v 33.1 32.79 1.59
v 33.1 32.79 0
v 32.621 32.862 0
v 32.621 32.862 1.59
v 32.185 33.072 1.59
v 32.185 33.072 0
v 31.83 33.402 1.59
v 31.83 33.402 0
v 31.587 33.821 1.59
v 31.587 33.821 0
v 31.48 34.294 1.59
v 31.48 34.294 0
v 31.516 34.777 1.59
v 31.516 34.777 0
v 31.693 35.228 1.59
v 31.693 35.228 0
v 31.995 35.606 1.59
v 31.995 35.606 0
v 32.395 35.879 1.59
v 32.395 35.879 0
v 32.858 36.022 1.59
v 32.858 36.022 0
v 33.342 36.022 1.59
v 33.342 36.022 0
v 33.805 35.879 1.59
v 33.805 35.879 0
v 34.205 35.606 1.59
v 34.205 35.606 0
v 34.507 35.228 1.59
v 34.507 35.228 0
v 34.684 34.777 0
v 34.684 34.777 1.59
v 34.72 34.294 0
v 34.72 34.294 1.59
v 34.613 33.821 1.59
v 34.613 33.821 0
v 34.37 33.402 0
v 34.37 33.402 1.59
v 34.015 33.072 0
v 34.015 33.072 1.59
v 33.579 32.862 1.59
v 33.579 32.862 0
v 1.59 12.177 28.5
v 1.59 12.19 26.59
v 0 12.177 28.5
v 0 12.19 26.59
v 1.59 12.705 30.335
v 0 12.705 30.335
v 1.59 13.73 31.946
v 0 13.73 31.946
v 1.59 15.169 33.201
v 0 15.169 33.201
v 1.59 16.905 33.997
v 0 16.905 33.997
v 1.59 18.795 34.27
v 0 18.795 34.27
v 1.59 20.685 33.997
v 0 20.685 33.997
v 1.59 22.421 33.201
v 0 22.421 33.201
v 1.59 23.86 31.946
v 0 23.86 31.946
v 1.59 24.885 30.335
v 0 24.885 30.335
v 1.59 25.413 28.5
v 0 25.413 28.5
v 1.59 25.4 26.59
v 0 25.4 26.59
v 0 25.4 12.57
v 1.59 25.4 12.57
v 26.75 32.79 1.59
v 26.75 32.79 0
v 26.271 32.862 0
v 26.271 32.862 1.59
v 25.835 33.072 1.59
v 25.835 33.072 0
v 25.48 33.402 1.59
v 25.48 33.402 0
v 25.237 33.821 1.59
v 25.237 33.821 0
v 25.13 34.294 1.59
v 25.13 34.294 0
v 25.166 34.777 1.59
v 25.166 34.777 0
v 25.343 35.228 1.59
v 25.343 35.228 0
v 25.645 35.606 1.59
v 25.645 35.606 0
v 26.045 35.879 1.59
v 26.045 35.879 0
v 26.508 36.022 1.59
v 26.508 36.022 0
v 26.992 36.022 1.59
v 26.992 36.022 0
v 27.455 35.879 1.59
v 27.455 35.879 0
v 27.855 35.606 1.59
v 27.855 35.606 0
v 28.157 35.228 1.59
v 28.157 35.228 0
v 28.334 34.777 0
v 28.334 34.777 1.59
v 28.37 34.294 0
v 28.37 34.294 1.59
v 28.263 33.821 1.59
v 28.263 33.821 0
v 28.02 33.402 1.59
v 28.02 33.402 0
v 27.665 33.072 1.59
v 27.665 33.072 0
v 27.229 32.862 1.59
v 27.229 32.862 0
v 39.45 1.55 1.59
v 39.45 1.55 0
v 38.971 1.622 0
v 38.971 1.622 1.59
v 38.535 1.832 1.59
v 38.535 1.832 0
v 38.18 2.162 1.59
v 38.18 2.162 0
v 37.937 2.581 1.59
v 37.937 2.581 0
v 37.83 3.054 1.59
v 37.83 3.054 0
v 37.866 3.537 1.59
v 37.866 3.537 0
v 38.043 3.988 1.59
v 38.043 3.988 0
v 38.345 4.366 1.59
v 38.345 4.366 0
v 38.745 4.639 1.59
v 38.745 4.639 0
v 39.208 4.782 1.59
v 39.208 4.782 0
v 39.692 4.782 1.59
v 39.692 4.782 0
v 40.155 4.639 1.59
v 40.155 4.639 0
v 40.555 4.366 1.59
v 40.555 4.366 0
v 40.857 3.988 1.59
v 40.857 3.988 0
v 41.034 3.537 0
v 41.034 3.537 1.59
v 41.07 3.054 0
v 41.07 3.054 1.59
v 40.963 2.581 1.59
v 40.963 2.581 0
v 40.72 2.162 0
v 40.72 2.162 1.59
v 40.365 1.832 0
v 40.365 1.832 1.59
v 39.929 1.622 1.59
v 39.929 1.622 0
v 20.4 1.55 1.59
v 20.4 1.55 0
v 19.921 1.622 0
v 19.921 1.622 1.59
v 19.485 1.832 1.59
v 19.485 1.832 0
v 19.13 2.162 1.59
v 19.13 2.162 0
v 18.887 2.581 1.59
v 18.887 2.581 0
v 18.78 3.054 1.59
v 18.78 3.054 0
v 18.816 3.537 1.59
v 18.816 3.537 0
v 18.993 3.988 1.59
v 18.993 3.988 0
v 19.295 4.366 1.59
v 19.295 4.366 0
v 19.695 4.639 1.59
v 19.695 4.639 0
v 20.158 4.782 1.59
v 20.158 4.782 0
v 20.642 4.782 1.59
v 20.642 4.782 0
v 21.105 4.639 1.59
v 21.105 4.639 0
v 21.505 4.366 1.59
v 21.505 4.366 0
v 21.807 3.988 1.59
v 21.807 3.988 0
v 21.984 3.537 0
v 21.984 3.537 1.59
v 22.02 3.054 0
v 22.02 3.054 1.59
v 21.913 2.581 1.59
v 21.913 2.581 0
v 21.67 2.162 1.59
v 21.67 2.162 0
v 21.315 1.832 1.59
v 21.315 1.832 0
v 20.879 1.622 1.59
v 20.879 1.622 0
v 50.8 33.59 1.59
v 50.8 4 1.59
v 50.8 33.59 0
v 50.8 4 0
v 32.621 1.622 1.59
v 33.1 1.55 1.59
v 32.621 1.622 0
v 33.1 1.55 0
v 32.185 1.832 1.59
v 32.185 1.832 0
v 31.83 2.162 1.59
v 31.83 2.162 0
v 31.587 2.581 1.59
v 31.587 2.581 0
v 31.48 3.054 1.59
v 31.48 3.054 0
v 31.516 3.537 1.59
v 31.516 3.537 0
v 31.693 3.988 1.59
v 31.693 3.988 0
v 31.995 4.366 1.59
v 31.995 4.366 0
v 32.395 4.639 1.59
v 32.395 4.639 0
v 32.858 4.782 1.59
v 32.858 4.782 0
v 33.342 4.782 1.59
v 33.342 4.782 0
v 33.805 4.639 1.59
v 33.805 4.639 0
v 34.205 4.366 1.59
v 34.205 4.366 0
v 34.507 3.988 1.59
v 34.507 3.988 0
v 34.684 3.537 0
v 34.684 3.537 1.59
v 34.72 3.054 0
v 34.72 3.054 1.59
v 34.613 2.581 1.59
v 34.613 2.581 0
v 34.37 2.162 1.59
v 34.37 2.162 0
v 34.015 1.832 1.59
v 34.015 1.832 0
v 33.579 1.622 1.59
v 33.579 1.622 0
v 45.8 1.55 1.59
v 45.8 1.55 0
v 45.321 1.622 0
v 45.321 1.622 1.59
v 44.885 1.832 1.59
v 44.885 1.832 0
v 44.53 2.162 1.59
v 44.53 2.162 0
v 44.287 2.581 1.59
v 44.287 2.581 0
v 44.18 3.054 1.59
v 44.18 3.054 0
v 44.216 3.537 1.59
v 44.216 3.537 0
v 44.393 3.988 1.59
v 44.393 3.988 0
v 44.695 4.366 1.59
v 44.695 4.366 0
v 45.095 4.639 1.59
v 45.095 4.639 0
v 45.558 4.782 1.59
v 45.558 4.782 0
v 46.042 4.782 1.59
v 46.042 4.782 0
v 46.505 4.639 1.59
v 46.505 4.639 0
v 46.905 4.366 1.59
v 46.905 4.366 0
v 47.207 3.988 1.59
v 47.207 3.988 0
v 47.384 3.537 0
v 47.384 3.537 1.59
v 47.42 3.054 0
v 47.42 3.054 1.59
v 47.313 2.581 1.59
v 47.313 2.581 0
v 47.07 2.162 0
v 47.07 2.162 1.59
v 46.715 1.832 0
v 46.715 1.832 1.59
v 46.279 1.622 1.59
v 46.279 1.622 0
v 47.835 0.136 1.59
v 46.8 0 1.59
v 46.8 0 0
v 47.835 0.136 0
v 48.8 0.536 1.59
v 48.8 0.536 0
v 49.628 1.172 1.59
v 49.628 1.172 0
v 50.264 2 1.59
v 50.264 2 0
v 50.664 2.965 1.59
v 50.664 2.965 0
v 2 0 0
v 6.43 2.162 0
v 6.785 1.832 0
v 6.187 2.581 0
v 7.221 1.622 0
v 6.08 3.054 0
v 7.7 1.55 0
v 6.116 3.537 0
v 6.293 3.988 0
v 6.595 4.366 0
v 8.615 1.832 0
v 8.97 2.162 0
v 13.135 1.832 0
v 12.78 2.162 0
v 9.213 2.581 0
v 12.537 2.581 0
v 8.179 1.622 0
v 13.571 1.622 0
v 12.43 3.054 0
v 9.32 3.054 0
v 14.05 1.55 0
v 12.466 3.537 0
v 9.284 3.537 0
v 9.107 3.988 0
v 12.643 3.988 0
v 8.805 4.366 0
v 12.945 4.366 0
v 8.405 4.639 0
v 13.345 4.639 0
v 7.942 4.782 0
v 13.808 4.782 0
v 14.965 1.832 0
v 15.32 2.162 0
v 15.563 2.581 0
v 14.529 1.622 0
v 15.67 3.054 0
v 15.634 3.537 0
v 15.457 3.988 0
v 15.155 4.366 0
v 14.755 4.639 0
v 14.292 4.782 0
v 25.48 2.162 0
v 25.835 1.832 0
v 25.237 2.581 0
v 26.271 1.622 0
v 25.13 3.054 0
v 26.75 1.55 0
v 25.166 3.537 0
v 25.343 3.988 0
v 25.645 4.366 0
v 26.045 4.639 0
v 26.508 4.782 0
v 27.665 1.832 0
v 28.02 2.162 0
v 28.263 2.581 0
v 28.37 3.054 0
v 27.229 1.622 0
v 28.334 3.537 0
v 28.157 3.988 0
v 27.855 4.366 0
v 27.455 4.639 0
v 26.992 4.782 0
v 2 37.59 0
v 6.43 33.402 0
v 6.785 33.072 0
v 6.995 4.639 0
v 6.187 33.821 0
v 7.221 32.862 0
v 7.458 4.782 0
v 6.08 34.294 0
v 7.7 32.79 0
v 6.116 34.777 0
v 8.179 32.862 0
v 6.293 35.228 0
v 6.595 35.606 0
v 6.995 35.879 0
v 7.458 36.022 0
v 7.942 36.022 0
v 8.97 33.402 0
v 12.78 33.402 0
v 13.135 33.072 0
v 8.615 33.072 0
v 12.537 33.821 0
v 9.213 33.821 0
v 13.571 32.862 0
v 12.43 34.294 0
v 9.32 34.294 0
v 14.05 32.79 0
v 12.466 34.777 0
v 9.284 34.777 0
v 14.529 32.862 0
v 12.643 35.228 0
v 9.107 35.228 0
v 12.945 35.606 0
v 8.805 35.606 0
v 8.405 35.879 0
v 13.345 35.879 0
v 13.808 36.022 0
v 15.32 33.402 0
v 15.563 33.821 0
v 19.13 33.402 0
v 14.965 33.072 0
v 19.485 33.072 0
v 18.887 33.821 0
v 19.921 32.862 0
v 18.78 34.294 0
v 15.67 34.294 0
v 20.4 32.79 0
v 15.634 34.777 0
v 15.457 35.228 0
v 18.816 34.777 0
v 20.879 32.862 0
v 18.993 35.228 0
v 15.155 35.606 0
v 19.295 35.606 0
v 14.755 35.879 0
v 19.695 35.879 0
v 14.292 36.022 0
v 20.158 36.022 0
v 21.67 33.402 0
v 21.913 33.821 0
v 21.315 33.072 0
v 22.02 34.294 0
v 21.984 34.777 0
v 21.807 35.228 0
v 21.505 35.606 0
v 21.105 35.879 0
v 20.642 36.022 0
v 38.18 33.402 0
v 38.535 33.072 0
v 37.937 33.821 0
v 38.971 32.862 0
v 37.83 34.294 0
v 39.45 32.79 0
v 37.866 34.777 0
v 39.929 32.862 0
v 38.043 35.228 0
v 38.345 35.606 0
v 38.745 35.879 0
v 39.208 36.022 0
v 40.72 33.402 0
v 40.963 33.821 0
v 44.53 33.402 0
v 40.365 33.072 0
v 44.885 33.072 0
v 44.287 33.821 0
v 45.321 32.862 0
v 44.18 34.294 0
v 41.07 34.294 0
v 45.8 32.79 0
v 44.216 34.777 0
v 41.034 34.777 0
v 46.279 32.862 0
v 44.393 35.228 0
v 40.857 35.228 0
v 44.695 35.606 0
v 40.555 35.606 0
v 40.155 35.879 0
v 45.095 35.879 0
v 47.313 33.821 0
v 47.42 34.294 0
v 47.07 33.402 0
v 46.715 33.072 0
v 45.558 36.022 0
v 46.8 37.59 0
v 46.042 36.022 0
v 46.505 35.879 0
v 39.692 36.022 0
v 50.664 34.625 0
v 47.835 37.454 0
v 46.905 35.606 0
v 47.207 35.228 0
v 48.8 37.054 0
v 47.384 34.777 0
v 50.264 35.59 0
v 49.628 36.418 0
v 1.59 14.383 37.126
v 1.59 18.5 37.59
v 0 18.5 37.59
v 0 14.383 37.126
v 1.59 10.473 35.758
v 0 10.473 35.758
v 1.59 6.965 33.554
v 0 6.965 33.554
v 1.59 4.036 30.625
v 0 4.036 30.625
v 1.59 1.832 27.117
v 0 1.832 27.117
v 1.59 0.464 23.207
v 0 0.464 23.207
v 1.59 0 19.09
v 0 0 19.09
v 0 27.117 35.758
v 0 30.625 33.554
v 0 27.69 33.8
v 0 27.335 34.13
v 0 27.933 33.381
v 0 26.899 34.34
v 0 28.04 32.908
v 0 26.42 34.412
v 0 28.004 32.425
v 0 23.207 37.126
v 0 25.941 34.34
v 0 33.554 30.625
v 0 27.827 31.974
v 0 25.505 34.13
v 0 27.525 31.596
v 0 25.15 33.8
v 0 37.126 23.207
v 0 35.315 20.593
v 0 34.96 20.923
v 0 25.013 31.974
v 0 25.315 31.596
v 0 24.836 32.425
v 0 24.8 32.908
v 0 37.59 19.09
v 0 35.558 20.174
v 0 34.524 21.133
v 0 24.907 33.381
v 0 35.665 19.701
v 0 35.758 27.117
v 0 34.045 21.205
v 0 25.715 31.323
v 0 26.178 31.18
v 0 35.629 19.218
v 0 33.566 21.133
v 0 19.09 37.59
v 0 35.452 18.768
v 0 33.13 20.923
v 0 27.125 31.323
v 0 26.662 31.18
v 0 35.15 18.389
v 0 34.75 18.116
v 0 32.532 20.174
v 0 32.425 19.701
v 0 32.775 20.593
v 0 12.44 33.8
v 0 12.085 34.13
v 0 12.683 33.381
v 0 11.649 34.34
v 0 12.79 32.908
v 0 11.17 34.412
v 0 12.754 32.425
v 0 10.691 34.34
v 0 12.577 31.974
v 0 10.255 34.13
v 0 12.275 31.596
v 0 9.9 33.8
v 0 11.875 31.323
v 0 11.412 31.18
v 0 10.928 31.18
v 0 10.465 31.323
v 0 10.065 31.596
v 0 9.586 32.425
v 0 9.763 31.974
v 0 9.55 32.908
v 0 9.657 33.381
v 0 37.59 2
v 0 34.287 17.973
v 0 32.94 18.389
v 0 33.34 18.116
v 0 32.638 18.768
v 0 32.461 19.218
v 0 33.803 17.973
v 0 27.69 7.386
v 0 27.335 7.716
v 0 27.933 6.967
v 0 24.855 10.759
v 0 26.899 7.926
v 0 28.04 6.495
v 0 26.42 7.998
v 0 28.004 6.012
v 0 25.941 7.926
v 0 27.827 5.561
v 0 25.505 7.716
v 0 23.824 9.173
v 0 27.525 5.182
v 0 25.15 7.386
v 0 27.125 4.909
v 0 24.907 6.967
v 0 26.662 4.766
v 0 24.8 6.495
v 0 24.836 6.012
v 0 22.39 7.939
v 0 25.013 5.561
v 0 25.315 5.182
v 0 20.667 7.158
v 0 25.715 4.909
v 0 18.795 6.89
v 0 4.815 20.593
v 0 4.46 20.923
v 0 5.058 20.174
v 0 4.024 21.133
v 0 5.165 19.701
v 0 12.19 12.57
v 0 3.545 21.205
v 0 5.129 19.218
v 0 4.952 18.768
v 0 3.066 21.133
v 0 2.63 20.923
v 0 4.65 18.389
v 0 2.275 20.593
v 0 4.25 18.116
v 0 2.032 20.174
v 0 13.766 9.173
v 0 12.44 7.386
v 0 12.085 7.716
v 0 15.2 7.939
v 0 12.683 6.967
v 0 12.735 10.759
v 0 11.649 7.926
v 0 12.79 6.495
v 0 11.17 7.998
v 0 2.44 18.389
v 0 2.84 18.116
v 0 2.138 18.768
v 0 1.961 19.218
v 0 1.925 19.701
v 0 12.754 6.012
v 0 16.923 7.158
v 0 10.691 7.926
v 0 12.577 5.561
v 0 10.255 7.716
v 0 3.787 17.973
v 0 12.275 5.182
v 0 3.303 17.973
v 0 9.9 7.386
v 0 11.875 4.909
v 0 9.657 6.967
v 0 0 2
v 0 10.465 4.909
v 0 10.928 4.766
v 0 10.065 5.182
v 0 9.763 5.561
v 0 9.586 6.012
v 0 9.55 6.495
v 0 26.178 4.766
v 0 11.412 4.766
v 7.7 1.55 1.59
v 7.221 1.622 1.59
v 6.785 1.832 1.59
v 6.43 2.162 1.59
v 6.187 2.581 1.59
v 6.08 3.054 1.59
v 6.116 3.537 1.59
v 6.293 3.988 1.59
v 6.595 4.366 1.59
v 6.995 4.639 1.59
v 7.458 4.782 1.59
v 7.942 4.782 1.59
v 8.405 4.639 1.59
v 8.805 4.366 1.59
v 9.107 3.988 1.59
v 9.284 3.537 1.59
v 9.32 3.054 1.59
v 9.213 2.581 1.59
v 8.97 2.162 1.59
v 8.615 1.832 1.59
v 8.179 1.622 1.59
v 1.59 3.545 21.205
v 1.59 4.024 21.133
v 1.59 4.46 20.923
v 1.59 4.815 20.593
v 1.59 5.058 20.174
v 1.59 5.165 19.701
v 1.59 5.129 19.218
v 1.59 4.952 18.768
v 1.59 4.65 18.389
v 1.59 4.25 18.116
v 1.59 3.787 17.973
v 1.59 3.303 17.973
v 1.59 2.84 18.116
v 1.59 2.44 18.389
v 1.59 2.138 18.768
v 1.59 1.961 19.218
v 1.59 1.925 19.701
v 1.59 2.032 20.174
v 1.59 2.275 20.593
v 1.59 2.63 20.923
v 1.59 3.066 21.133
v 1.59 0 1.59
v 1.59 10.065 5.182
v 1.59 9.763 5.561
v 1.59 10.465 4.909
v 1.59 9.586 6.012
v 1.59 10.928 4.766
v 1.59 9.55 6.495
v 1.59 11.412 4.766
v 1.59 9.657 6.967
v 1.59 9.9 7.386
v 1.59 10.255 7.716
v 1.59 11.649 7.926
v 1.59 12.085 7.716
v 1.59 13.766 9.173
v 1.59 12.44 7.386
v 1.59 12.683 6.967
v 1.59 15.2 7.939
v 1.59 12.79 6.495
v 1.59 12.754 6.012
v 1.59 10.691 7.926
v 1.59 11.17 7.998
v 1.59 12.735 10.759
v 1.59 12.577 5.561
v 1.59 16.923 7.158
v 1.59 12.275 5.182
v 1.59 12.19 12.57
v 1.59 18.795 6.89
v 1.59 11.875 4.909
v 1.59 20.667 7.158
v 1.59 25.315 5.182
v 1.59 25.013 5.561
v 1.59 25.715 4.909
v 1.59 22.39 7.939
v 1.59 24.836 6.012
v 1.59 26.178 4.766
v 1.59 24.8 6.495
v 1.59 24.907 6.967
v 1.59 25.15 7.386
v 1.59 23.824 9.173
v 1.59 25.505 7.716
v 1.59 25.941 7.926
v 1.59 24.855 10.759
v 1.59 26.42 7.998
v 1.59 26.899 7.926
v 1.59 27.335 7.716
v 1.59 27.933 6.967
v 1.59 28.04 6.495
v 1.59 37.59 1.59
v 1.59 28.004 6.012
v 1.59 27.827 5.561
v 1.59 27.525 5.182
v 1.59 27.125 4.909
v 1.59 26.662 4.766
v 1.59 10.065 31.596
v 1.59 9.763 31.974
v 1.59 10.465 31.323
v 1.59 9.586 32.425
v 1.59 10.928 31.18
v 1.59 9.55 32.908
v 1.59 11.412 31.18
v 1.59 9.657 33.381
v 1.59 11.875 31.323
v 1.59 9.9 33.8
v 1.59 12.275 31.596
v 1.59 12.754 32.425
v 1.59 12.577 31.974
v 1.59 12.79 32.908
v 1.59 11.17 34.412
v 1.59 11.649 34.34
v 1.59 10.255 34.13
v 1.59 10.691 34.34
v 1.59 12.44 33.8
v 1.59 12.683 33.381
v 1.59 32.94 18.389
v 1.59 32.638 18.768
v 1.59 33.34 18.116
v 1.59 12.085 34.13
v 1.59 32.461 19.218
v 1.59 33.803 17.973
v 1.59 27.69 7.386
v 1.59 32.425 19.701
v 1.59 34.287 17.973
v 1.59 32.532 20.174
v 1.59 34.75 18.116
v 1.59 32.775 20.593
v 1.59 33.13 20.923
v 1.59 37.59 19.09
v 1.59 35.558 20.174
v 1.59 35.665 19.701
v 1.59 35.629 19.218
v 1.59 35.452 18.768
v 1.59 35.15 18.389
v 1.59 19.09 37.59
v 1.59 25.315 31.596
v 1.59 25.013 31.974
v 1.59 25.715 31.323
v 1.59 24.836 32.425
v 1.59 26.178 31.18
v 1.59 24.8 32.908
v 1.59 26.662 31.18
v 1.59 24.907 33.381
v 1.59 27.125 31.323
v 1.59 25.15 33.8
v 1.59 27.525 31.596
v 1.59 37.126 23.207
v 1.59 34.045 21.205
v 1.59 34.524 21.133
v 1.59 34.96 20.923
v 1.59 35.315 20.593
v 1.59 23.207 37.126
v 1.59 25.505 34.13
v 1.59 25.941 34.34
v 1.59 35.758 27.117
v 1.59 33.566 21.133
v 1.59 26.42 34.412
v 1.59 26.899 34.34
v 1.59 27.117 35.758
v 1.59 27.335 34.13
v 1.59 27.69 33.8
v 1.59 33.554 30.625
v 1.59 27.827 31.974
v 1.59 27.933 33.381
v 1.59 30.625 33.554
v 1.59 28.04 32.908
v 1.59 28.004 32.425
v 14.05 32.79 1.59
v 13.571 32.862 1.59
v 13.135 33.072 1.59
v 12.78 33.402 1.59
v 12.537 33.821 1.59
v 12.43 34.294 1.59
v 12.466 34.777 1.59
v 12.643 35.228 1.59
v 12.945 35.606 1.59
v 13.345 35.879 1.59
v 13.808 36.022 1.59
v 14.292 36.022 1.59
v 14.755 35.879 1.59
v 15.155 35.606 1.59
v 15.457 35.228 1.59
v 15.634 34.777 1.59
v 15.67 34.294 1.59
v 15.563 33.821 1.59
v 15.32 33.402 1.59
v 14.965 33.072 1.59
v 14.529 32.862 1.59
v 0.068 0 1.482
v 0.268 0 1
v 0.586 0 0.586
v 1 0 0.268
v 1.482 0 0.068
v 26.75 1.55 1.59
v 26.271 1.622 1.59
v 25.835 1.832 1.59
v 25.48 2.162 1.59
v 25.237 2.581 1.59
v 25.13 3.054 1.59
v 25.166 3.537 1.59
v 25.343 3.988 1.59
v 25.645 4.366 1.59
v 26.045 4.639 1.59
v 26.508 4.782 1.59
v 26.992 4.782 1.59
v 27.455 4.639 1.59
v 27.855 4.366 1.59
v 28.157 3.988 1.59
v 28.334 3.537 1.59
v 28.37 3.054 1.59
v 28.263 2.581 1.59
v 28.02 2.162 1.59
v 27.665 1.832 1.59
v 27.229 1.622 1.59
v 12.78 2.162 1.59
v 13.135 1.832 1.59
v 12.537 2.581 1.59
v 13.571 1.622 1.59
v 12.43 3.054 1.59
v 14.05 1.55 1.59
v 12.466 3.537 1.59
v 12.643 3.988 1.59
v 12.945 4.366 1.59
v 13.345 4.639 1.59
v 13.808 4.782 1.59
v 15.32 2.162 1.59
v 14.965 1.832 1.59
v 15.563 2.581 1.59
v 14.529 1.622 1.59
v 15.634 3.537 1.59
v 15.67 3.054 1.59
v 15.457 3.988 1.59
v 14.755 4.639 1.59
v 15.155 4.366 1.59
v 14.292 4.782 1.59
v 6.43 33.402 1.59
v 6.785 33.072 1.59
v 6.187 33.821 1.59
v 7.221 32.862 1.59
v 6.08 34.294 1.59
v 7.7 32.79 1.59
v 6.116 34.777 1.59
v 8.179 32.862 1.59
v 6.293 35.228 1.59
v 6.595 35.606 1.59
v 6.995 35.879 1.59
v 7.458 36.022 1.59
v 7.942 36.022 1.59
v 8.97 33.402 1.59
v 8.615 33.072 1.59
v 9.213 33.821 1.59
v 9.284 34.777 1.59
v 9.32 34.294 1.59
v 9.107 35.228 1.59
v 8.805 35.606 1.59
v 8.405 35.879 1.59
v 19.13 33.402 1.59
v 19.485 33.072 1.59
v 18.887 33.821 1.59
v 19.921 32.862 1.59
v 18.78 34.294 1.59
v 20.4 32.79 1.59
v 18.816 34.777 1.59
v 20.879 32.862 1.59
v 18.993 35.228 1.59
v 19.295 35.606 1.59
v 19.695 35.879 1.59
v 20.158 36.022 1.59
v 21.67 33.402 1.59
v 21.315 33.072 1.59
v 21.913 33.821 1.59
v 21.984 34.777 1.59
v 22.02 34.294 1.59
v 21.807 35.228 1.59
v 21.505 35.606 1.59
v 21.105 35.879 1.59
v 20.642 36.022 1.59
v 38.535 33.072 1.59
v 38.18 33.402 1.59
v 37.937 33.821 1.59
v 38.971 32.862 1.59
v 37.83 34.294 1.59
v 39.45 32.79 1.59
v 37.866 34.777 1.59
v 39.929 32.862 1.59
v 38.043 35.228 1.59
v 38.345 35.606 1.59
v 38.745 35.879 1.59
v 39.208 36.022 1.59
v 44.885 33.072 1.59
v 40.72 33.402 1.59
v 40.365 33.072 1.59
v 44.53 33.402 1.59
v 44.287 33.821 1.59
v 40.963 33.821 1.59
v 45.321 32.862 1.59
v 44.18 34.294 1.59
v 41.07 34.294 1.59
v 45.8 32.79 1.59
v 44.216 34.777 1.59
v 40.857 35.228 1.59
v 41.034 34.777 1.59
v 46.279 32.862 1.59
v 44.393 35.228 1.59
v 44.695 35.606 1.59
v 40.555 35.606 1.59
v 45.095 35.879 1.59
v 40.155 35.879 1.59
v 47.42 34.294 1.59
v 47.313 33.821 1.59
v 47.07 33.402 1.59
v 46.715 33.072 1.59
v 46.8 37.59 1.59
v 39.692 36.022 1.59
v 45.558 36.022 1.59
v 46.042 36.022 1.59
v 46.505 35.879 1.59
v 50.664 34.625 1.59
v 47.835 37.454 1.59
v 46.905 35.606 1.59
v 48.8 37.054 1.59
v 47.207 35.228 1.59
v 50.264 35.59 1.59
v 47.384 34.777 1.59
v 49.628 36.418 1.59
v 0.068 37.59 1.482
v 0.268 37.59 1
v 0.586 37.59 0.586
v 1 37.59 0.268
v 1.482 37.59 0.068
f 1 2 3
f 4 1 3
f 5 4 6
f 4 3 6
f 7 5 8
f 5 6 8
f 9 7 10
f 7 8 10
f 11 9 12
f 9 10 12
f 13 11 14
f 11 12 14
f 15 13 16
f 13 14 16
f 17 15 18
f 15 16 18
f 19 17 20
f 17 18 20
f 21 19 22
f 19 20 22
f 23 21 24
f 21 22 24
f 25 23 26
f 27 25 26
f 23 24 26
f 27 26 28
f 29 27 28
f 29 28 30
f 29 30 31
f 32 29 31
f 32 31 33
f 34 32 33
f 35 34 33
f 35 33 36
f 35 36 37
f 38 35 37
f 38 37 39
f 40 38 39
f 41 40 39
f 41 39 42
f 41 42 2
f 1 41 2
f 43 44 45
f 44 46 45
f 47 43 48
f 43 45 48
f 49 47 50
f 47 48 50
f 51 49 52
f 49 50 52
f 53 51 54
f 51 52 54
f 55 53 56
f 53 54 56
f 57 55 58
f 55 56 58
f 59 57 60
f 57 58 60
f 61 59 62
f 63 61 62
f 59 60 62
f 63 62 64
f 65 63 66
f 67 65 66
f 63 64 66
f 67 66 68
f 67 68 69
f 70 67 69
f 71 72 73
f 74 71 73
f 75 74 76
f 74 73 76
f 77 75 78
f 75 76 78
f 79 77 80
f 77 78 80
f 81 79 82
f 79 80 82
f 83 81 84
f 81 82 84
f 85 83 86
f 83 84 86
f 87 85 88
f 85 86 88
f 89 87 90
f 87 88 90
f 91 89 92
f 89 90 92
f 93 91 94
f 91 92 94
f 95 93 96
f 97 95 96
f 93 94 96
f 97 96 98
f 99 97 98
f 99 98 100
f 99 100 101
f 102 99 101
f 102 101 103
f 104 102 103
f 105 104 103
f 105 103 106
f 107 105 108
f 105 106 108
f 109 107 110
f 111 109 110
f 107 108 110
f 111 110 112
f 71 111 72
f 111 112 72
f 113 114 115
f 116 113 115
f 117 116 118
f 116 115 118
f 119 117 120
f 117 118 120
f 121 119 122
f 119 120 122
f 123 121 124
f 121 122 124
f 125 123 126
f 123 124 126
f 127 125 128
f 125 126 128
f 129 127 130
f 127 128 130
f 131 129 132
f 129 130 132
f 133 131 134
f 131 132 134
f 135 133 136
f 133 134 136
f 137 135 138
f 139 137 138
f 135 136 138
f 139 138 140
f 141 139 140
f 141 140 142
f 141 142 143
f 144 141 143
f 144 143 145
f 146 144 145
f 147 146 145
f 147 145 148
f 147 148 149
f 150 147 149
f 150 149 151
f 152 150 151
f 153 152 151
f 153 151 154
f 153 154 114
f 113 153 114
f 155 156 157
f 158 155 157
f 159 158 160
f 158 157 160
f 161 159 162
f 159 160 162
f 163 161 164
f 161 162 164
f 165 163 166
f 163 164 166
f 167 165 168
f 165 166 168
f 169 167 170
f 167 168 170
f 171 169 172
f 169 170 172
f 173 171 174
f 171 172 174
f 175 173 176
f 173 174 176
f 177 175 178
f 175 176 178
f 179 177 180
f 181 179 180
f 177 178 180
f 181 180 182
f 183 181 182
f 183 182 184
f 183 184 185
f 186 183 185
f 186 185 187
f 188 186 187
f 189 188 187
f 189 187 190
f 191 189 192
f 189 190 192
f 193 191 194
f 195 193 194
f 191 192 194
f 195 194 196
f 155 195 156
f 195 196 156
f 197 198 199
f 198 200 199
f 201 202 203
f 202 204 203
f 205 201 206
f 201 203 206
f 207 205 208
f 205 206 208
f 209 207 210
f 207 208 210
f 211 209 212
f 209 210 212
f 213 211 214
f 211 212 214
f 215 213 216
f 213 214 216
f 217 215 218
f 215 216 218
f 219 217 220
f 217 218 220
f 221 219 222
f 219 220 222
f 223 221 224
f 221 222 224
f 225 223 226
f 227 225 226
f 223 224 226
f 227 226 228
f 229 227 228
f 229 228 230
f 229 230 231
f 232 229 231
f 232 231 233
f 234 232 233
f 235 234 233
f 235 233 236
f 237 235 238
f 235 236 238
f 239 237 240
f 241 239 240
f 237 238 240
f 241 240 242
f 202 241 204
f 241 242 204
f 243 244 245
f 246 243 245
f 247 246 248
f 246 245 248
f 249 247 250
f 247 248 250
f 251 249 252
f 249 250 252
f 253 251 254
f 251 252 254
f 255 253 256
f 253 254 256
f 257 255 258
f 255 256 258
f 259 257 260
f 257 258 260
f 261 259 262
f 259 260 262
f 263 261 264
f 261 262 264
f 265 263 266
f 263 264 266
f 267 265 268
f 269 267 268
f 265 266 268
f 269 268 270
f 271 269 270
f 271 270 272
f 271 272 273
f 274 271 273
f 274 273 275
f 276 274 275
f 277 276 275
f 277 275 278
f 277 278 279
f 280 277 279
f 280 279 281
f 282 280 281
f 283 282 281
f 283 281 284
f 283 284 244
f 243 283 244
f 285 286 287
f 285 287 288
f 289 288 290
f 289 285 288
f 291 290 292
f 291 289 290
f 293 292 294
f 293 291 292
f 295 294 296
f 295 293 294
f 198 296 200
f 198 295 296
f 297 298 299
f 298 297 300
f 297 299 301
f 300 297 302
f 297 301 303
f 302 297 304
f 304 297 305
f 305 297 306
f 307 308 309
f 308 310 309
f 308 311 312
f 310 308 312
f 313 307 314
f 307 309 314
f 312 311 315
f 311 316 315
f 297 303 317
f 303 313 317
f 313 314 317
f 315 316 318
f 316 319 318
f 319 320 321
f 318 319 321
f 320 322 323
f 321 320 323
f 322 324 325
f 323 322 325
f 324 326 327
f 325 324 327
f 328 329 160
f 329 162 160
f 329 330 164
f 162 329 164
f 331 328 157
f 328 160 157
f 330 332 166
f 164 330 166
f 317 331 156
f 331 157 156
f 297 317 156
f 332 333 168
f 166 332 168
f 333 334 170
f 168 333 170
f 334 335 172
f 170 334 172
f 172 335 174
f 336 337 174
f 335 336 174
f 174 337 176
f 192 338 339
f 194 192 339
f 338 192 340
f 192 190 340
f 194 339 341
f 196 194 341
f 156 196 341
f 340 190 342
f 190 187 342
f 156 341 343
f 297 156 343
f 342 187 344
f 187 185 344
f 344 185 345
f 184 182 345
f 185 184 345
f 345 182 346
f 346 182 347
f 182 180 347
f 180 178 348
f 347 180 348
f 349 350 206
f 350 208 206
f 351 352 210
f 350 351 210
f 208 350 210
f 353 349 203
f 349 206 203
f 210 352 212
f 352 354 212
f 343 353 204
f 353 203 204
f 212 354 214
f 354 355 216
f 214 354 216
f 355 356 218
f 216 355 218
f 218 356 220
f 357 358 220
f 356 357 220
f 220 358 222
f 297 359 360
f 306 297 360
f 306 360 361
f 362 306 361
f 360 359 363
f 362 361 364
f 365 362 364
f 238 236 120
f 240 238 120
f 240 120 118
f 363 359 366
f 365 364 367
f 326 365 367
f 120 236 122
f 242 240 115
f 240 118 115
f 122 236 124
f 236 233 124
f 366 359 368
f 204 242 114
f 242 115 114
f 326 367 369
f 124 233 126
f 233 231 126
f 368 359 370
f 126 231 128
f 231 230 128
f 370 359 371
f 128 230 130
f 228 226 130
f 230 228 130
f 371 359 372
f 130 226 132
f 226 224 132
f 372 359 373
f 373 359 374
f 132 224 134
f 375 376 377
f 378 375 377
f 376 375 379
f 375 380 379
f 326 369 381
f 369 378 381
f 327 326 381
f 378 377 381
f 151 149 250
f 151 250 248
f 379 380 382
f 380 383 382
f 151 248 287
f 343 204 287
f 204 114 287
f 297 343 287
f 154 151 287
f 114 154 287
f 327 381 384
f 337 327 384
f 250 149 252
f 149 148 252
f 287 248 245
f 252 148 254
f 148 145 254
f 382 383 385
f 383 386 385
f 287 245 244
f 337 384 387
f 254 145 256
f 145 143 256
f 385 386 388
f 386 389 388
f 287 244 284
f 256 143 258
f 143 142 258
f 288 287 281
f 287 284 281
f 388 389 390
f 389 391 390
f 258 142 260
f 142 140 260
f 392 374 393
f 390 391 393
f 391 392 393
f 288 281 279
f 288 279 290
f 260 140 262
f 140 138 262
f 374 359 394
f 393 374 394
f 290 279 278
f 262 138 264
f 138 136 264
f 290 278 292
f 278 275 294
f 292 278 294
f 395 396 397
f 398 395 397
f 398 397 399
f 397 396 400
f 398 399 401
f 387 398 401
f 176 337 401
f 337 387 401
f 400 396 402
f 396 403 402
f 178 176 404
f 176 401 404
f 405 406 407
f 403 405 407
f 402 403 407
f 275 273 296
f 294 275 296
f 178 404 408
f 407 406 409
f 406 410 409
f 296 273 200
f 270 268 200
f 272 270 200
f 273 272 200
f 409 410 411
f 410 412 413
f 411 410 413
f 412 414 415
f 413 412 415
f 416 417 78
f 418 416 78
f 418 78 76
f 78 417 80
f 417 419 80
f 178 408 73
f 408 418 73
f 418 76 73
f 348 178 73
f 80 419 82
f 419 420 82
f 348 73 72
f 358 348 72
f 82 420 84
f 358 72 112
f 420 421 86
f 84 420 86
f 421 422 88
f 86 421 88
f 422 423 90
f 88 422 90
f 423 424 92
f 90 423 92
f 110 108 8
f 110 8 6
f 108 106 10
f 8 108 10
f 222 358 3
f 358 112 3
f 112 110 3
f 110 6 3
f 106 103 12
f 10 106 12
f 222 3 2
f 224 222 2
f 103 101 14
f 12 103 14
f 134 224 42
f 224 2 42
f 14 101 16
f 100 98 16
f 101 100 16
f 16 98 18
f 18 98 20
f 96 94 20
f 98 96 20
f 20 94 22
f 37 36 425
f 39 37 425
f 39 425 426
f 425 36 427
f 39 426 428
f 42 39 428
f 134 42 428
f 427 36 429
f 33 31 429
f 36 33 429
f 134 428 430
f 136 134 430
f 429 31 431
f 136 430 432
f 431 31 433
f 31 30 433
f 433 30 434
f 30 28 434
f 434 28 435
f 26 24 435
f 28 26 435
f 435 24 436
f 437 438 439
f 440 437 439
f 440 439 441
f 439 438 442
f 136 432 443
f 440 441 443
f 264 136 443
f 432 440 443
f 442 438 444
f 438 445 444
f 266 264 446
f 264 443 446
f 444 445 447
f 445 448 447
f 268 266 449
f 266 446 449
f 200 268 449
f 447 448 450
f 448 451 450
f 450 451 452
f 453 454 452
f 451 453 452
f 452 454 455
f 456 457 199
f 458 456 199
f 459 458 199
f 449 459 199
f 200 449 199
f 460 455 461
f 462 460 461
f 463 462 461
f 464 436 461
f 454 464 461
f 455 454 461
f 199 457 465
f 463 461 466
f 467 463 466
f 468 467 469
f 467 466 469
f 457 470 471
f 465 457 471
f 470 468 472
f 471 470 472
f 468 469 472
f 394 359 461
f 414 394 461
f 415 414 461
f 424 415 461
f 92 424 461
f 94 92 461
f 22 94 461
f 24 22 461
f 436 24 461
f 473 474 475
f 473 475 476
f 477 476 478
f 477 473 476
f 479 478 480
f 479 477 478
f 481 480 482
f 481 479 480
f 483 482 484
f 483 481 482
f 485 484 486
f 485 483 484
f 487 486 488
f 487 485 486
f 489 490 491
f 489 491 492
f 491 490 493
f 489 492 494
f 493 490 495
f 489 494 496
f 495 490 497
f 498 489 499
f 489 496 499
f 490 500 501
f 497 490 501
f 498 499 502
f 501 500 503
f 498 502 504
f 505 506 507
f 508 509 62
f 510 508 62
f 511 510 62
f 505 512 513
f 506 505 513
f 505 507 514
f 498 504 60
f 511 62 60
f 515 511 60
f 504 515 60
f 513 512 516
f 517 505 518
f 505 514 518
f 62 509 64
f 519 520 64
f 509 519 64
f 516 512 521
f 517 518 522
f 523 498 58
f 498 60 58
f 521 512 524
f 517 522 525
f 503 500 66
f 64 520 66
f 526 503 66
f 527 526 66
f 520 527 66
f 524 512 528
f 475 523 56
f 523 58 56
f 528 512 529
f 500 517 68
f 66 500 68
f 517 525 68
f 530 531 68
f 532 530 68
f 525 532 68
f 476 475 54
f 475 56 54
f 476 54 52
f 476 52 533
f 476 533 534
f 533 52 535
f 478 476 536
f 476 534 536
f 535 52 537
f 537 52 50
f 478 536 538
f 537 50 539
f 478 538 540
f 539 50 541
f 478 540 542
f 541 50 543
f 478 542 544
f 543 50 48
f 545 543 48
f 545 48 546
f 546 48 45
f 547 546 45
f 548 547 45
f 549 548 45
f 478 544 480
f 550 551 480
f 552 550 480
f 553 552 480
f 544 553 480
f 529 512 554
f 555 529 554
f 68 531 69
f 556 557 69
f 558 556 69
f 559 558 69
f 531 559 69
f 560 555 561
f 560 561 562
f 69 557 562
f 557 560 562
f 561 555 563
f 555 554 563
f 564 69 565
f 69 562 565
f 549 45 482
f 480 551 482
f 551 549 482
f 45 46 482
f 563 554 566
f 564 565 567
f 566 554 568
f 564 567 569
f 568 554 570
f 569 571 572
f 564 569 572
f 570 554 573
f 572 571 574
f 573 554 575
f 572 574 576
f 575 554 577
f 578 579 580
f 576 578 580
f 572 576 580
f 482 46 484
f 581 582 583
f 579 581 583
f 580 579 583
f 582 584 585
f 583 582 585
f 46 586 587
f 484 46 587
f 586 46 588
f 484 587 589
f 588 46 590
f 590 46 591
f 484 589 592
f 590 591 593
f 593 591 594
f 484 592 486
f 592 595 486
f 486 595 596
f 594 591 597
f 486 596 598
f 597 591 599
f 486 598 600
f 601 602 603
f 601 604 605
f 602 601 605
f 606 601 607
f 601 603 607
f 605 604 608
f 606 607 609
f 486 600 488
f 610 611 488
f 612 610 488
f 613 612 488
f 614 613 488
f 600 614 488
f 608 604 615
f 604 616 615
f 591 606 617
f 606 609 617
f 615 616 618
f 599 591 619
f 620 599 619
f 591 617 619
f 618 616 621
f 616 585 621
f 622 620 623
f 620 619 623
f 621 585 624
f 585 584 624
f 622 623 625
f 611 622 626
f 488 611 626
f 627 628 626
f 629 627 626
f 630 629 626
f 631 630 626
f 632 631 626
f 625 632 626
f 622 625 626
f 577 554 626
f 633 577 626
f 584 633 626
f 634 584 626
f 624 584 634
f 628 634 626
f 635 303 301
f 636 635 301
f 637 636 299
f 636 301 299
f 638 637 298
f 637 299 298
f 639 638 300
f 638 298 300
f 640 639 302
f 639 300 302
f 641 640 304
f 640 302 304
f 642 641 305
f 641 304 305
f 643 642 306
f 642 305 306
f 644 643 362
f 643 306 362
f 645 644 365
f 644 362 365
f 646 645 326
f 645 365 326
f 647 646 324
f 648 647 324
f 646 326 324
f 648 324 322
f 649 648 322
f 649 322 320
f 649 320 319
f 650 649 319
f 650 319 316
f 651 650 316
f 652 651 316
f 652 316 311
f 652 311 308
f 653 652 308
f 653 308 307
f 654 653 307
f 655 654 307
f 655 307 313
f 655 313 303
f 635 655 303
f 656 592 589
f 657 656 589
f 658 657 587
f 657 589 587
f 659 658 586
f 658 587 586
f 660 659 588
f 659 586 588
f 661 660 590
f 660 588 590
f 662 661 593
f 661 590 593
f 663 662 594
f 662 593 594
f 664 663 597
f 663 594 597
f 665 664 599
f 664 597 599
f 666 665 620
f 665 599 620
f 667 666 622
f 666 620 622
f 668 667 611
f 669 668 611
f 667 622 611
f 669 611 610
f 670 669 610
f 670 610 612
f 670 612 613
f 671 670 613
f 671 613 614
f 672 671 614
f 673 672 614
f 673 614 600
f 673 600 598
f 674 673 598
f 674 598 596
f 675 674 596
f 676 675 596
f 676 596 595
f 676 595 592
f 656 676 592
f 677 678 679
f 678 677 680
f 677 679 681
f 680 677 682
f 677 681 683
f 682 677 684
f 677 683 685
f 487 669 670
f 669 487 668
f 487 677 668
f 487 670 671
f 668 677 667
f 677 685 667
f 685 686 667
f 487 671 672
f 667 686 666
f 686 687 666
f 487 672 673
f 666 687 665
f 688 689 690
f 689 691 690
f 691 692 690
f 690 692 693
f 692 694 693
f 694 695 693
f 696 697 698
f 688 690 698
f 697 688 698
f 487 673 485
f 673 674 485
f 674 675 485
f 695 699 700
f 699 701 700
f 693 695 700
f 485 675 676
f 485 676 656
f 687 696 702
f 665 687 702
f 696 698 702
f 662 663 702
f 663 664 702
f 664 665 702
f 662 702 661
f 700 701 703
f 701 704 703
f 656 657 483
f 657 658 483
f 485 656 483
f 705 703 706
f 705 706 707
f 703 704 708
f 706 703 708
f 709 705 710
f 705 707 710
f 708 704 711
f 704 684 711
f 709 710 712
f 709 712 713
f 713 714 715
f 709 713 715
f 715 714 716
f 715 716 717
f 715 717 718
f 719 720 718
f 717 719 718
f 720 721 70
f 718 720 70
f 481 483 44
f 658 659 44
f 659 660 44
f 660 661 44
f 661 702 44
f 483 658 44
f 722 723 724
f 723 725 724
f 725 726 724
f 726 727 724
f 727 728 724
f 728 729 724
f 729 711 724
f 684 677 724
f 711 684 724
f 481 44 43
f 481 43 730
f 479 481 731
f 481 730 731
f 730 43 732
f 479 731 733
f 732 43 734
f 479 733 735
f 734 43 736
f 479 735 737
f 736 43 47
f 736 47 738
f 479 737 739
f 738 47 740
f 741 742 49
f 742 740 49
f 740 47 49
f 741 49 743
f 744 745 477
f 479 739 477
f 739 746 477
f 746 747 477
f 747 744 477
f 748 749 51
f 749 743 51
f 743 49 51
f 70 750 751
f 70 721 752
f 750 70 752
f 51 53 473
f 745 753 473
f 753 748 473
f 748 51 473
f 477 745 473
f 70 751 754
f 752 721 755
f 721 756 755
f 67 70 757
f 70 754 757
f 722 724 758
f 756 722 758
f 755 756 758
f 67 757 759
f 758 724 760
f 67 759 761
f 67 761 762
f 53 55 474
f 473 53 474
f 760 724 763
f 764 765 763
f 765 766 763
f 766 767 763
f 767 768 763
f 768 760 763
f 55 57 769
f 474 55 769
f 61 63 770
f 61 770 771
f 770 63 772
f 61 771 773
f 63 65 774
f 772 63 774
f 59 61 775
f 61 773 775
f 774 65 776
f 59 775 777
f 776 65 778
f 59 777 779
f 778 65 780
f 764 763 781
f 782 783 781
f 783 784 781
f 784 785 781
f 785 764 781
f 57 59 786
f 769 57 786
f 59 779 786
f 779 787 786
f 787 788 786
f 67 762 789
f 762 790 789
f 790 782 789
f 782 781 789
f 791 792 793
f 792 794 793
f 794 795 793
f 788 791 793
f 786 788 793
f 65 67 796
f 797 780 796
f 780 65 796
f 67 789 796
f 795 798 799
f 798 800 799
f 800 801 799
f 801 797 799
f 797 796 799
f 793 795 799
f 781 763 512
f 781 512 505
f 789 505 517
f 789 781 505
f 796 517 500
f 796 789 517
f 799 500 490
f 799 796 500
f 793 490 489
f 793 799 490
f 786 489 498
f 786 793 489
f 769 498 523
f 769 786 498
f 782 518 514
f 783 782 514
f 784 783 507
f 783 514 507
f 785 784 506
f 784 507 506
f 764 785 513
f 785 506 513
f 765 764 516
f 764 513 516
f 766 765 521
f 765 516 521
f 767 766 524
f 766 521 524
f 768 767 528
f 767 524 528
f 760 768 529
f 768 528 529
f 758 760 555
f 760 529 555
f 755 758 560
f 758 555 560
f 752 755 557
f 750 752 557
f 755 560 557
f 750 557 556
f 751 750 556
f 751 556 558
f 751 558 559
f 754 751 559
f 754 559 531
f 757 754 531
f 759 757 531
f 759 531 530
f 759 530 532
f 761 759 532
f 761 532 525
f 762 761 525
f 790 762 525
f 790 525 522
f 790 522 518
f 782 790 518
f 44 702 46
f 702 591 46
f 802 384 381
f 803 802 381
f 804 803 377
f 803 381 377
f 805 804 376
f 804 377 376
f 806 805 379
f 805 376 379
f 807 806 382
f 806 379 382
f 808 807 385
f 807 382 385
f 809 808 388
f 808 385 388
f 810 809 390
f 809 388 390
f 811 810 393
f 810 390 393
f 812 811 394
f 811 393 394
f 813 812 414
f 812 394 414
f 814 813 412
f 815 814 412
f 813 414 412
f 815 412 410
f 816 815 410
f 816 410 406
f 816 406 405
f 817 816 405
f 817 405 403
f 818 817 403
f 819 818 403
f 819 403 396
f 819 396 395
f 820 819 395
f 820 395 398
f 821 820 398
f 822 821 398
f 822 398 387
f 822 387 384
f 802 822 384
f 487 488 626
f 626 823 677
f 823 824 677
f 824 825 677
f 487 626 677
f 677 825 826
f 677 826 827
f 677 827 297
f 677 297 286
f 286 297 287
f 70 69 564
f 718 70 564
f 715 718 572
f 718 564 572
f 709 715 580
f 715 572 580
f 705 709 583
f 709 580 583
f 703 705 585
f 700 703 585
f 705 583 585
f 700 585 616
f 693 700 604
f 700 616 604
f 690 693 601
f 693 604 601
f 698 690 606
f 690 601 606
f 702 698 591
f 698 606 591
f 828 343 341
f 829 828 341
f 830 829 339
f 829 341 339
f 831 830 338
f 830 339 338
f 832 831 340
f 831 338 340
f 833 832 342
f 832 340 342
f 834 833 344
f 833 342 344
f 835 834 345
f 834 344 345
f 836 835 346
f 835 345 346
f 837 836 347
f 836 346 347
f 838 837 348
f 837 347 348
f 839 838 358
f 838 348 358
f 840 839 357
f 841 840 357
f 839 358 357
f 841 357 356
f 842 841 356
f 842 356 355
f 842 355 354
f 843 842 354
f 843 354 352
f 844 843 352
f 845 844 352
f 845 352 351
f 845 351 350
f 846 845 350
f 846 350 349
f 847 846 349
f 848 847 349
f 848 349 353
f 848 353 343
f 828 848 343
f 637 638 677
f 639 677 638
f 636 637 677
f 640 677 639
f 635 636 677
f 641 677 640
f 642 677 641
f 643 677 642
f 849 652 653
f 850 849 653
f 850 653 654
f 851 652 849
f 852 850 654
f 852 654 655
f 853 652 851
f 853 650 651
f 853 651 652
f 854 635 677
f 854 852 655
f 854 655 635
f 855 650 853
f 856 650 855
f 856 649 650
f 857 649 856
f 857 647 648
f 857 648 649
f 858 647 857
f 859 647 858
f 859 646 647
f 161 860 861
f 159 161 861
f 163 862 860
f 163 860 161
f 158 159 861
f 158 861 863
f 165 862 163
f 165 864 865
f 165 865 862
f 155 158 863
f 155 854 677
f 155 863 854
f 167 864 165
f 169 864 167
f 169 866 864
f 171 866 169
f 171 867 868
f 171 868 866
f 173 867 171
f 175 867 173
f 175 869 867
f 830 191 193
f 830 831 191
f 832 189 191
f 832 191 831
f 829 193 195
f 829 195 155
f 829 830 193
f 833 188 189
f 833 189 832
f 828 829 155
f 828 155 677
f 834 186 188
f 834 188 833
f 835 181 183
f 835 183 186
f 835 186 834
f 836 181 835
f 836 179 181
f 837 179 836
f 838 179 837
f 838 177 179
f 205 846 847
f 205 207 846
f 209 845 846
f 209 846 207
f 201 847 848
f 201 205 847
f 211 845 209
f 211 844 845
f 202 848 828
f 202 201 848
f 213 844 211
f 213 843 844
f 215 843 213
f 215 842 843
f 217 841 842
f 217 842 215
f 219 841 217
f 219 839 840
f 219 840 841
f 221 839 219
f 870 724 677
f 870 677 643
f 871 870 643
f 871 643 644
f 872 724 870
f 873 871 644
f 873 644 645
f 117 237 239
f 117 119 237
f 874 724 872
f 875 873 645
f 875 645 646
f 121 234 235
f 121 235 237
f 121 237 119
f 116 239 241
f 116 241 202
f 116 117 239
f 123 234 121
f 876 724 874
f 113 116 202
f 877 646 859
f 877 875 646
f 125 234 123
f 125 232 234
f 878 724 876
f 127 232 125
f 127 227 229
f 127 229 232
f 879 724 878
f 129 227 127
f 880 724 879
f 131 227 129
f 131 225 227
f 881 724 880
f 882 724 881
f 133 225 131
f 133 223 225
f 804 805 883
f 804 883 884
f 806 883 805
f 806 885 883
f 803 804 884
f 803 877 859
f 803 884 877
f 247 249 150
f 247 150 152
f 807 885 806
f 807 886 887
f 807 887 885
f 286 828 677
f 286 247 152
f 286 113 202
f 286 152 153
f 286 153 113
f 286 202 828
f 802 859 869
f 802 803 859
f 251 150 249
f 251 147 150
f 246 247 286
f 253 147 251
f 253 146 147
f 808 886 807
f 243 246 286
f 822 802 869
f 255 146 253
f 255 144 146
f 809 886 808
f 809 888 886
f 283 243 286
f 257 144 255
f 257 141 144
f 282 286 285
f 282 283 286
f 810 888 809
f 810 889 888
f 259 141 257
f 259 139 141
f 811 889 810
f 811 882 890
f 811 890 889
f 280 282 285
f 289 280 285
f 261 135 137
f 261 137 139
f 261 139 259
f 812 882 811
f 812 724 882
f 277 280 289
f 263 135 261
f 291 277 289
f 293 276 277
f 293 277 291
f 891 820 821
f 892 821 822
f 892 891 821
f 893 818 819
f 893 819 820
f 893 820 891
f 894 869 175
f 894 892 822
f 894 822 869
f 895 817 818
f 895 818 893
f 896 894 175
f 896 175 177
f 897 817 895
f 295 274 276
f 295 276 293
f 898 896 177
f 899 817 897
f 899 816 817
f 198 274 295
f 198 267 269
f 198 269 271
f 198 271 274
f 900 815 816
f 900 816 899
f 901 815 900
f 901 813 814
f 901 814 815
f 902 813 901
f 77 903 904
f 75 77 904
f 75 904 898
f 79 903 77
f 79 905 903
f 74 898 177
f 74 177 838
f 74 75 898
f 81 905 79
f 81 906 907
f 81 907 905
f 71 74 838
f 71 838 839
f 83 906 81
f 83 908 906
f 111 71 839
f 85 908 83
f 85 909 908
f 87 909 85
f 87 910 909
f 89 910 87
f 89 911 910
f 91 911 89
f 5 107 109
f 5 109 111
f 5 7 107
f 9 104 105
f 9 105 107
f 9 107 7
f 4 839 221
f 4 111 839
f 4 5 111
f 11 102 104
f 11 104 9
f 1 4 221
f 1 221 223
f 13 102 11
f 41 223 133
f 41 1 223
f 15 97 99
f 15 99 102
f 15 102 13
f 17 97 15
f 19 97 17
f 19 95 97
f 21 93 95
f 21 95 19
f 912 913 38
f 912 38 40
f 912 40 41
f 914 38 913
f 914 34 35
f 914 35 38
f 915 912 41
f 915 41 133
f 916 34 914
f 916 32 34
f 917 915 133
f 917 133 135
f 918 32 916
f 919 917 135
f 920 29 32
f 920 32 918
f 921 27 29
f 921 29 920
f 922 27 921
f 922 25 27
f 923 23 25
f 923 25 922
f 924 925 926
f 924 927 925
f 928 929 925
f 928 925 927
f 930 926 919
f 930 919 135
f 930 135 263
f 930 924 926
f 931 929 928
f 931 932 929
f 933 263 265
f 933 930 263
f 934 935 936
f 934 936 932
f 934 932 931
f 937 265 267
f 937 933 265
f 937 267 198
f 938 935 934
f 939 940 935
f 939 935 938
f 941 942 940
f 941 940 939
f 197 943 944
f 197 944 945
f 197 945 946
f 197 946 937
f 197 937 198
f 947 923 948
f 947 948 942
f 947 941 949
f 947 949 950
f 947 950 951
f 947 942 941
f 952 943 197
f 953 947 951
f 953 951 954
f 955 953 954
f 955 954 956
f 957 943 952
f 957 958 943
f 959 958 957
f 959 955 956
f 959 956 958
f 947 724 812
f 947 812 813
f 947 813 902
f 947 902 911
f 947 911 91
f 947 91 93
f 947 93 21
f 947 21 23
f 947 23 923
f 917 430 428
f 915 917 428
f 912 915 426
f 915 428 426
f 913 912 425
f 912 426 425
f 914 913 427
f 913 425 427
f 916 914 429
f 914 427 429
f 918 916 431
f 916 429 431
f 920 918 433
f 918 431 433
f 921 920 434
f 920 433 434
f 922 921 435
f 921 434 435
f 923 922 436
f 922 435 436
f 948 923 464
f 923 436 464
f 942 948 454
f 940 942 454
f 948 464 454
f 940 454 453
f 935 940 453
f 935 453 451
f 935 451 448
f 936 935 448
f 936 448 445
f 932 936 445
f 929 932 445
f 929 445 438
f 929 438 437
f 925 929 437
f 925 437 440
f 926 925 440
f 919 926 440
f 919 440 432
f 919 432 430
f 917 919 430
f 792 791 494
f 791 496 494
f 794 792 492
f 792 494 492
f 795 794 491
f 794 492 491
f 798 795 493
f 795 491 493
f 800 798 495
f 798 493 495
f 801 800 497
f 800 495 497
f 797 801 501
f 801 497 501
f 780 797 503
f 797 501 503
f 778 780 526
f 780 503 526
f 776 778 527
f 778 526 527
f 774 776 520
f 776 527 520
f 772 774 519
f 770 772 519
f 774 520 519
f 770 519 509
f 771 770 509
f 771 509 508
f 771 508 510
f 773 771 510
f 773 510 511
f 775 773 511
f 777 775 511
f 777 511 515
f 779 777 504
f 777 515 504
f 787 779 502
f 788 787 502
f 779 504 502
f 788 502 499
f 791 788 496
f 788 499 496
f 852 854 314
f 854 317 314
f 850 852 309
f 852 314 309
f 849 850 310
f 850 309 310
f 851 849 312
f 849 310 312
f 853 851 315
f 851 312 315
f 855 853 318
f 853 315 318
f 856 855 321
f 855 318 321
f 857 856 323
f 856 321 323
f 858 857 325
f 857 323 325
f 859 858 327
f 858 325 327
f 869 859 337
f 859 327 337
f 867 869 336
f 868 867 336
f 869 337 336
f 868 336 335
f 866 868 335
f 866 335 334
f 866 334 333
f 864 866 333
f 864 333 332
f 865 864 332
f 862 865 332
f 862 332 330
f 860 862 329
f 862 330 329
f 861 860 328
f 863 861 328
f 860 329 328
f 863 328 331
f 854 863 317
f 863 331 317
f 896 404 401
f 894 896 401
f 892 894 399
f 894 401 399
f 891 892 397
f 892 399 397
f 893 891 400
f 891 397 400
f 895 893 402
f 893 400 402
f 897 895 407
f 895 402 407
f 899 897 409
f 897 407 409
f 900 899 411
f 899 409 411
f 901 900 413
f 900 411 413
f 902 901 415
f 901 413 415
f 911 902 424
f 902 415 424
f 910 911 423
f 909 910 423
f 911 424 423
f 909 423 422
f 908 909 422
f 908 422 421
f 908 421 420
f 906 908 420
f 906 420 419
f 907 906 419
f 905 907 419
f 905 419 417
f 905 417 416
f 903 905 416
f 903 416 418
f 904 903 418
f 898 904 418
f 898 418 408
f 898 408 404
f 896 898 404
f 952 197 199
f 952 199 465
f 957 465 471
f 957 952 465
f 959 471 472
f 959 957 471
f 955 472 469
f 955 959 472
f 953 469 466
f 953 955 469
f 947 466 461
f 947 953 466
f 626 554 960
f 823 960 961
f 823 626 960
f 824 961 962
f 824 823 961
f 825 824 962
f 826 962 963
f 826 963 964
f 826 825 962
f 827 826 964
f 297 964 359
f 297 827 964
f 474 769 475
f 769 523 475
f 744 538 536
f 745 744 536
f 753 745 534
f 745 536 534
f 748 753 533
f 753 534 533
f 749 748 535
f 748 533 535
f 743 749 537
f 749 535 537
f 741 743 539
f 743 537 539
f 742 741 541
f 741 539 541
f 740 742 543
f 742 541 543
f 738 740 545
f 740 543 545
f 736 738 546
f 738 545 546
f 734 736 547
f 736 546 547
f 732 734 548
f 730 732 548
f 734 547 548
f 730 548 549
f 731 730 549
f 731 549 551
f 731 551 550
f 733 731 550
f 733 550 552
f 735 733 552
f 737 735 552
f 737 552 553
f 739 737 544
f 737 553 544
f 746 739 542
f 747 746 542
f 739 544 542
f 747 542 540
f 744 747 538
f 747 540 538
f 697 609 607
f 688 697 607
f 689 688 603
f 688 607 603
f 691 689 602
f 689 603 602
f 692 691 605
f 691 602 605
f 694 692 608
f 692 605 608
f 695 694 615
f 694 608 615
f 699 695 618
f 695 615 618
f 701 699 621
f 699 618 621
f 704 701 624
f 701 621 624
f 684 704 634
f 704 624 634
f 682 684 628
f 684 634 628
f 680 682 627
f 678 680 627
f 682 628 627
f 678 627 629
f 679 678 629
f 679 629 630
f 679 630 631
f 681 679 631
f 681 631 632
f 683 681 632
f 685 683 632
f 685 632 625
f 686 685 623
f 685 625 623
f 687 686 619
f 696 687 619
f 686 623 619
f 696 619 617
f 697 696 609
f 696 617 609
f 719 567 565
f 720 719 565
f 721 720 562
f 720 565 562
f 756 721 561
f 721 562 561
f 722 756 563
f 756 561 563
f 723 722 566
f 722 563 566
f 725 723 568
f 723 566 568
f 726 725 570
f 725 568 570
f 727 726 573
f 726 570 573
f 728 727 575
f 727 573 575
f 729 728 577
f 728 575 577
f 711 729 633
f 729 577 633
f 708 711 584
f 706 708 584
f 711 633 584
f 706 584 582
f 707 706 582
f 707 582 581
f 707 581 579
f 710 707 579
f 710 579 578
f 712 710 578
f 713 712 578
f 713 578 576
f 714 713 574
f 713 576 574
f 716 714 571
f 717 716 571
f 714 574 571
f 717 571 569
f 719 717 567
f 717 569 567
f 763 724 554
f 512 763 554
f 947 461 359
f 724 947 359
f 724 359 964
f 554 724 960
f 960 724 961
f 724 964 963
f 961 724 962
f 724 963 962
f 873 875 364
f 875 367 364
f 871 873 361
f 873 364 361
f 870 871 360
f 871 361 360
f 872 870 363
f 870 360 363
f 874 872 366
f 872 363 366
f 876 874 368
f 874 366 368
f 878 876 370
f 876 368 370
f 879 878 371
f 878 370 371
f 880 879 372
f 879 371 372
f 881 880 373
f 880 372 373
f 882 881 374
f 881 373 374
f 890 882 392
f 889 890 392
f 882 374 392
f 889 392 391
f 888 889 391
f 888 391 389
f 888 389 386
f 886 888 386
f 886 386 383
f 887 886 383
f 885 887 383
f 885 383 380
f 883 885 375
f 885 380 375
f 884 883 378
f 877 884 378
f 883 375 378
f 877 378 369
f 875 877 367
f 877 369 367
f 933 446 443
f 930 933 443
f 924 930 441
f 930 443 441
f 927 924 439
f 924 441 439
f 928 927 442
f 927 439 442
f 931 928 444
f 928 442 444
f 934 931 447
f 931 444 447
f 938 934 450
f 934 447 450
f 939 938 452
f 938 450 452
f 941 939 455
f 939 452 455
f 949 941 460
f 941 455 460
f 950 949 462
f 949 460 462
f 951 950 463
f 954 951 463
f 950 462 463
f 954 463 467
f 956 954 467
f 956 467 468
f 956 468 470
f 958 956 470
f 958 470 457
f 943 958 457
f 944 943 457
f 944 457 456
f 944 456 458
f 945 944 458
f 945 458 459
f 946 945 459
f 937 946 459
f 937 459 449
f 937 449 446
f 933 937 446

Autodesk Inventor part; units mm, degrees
ref_plane "YZ Plane" through (0, 0, 0) normal (1, 0, 0) x (0, 1, 0)
ref_plane "XZ Plane" through (0, 0, 0) normal (0, 1, 0) x (-1, 0, 0)
ref_plane "XY Plane" through (0, 0, 0) normal (0, 0, 1) x (1, 0, 0)
sketch "Skizze1" plane through (0, 0, 0) normal (0, 0, 1) x (1, 0, 0)
  line L0 (0, 0) -> (50.8, 0)
  line L1 (50.8, 0) -> (50.8, 37.59)
  line L2 (50.8, 37.59) -> (0, 37.59)
  line L3 (0, 37.59) -> (0, 0)
  dimension "d0" = 37.59
  dimension "d1" = 50.8
extrude "Extrusion1" add sketch "Skizze1" along normal blind 1.59
sketch "Skizze4" plane through (0, 0, 0) normal (-1, 0, 0) x (0, 0, 1)
  line L0 (0, 37.59) -> (0, 0) projected
  line L1 (0, 0) -> (1.59, 0) projected
  line L2 (1.59, 37.59) -> (1.59, 0) projected
  line L3 (0, 37.59) -> (1.59, 37.59) projected
  line L4 (0, 37.59) -> (37.59, 37.59)
  line L5 (37.59, 37.59) -> (37.59, 0)
  line L6 (37.59, 0) -> (0, 0)
  line L7 (0, 0) -> (0, 37.59)
  dimension "d19" = 37.59
extrude "Extrusion2" add sketch "Skizze4" against normal blind 1.59 contours L4 L5 L6 L2
sketch "Skizze2" plane through (0, 0, 0) normal (-1, 0, 0) x (0, 0, 1)
  line L0 (0, 0) -> (1.59, 0) projected
  line L1 (1.59, 37.59) -> (1.59, 0) projected
  line L2 (0, 37.59) -> (18.59, 37.59)
  line L3 (37.59, 18.59) -> (37.59, 19)
  line L4 (18.59, 0) -> (0, 0)
  line L5 (0, 0) -> (0, 37.59)
  line L6 (37.59, 18.795) -> (-20.6317, 18.795) construction
  line L7 (26.59, 25.4) -> (12.57, 25.4)
  line L8 (12.57, 12.19) -> (26.59, 12.19)
  arc A0 (26.59, 12.19) -> (26.59, 25.4) centre (27.59, 18.795) ccw
  arc A1 (12.57, 25.4) -> (12.57, 12.19) centre (13.57, 18.795) ccw
  arc A2 (37.59, 18.59) -> (18.59, 37.59) centre (18.59, 18.59) ccw
  arc A3 (18.59, 0) -> (37.59, 19) centre (18.59, 19) ccw
  circle A4 centre (19.58, 18.795) radius 15.25 construction
  line L9 (19.58, 18.795) -> (19.58, 46.2315) construction
  circle A5 centre (32.7869, 26.42) radius 1.625
  circle A6 centre (32.7869, 11.17) radius 1.625
  circle A7 centre (19.58, 3.545) radius 1.625
  circle A8 centre (6.3731, 11.17) radius 1.625
  circle A9 centre (6.3731, 26.42) radius 1.625
  circle A10 centre (19.58, 34.045) radius 1.625
  line L10 (1.59, 0) -> (1.59, 37.59)
  point P0 (37.59, 37.59)
  point P1 (32.7869, 11.17)
  dimension "d4" = 37.59
  dimension "d5" = 14.02
  dimension "d6" = 13.21
  dimension "d8" = 11
  dimension "d9" = 19
  dimension "d10" = 30.5
  dimension "d13" = 360
  dimension "d15" = 3.25
  dimension "d16" = 3.25
  dimension "d17" = 3.25
extrude "Extrusion3" cut sketch "Skizze2" against normal blind 1.59 contours A0 L8 A1 L7 | A5 | A6 | A7 | A8 | A9 | A10
fillet "Rundung1" radius 18.5 2 edges at (0.795, 0, 37.59) (0.795, 37.59, 37.59)
fillet "Rundung2" radius 2 1 edges at (0, 18.795, 0)
fillet "Rundung3" radius 4 2 edges at (50.8, 0, 0.795) (50.8, 37.59, 0.795)
sketch "Skizze5" plane through (0, 0, 1.59) normal (0, 0, 1) x (1, 0, 0)
  line L0 (46.8, 37.59) -> (1.59, 37.59) projected
  line L1 (50.8, 4) -> (50.8, 33.59) projected
  line L2 (50.8, 18.795) -> (-11.9419, 18.795) construction
  point P0 (0, 0)
  point P1 (45.8, 34.415)
  point P2 (45.8, 3.175)
  dimension "d36" = 31.24
  dimension "d37" = 5
  dimension "d38" = 5
  dimension "d39" = 3.175
hole "Bohrung2" at (45.8, 34.415, 1.59) at (45.8, 3.175, 1.59) direction (0, 0, -1) diameter 3.25 end through all
pattern_linear "Rechteckige Anordnung1" count 7 spacing 6.35 along (-1, 0, 0) of "Bohrung2"
properties part number "Motorhalterung"
